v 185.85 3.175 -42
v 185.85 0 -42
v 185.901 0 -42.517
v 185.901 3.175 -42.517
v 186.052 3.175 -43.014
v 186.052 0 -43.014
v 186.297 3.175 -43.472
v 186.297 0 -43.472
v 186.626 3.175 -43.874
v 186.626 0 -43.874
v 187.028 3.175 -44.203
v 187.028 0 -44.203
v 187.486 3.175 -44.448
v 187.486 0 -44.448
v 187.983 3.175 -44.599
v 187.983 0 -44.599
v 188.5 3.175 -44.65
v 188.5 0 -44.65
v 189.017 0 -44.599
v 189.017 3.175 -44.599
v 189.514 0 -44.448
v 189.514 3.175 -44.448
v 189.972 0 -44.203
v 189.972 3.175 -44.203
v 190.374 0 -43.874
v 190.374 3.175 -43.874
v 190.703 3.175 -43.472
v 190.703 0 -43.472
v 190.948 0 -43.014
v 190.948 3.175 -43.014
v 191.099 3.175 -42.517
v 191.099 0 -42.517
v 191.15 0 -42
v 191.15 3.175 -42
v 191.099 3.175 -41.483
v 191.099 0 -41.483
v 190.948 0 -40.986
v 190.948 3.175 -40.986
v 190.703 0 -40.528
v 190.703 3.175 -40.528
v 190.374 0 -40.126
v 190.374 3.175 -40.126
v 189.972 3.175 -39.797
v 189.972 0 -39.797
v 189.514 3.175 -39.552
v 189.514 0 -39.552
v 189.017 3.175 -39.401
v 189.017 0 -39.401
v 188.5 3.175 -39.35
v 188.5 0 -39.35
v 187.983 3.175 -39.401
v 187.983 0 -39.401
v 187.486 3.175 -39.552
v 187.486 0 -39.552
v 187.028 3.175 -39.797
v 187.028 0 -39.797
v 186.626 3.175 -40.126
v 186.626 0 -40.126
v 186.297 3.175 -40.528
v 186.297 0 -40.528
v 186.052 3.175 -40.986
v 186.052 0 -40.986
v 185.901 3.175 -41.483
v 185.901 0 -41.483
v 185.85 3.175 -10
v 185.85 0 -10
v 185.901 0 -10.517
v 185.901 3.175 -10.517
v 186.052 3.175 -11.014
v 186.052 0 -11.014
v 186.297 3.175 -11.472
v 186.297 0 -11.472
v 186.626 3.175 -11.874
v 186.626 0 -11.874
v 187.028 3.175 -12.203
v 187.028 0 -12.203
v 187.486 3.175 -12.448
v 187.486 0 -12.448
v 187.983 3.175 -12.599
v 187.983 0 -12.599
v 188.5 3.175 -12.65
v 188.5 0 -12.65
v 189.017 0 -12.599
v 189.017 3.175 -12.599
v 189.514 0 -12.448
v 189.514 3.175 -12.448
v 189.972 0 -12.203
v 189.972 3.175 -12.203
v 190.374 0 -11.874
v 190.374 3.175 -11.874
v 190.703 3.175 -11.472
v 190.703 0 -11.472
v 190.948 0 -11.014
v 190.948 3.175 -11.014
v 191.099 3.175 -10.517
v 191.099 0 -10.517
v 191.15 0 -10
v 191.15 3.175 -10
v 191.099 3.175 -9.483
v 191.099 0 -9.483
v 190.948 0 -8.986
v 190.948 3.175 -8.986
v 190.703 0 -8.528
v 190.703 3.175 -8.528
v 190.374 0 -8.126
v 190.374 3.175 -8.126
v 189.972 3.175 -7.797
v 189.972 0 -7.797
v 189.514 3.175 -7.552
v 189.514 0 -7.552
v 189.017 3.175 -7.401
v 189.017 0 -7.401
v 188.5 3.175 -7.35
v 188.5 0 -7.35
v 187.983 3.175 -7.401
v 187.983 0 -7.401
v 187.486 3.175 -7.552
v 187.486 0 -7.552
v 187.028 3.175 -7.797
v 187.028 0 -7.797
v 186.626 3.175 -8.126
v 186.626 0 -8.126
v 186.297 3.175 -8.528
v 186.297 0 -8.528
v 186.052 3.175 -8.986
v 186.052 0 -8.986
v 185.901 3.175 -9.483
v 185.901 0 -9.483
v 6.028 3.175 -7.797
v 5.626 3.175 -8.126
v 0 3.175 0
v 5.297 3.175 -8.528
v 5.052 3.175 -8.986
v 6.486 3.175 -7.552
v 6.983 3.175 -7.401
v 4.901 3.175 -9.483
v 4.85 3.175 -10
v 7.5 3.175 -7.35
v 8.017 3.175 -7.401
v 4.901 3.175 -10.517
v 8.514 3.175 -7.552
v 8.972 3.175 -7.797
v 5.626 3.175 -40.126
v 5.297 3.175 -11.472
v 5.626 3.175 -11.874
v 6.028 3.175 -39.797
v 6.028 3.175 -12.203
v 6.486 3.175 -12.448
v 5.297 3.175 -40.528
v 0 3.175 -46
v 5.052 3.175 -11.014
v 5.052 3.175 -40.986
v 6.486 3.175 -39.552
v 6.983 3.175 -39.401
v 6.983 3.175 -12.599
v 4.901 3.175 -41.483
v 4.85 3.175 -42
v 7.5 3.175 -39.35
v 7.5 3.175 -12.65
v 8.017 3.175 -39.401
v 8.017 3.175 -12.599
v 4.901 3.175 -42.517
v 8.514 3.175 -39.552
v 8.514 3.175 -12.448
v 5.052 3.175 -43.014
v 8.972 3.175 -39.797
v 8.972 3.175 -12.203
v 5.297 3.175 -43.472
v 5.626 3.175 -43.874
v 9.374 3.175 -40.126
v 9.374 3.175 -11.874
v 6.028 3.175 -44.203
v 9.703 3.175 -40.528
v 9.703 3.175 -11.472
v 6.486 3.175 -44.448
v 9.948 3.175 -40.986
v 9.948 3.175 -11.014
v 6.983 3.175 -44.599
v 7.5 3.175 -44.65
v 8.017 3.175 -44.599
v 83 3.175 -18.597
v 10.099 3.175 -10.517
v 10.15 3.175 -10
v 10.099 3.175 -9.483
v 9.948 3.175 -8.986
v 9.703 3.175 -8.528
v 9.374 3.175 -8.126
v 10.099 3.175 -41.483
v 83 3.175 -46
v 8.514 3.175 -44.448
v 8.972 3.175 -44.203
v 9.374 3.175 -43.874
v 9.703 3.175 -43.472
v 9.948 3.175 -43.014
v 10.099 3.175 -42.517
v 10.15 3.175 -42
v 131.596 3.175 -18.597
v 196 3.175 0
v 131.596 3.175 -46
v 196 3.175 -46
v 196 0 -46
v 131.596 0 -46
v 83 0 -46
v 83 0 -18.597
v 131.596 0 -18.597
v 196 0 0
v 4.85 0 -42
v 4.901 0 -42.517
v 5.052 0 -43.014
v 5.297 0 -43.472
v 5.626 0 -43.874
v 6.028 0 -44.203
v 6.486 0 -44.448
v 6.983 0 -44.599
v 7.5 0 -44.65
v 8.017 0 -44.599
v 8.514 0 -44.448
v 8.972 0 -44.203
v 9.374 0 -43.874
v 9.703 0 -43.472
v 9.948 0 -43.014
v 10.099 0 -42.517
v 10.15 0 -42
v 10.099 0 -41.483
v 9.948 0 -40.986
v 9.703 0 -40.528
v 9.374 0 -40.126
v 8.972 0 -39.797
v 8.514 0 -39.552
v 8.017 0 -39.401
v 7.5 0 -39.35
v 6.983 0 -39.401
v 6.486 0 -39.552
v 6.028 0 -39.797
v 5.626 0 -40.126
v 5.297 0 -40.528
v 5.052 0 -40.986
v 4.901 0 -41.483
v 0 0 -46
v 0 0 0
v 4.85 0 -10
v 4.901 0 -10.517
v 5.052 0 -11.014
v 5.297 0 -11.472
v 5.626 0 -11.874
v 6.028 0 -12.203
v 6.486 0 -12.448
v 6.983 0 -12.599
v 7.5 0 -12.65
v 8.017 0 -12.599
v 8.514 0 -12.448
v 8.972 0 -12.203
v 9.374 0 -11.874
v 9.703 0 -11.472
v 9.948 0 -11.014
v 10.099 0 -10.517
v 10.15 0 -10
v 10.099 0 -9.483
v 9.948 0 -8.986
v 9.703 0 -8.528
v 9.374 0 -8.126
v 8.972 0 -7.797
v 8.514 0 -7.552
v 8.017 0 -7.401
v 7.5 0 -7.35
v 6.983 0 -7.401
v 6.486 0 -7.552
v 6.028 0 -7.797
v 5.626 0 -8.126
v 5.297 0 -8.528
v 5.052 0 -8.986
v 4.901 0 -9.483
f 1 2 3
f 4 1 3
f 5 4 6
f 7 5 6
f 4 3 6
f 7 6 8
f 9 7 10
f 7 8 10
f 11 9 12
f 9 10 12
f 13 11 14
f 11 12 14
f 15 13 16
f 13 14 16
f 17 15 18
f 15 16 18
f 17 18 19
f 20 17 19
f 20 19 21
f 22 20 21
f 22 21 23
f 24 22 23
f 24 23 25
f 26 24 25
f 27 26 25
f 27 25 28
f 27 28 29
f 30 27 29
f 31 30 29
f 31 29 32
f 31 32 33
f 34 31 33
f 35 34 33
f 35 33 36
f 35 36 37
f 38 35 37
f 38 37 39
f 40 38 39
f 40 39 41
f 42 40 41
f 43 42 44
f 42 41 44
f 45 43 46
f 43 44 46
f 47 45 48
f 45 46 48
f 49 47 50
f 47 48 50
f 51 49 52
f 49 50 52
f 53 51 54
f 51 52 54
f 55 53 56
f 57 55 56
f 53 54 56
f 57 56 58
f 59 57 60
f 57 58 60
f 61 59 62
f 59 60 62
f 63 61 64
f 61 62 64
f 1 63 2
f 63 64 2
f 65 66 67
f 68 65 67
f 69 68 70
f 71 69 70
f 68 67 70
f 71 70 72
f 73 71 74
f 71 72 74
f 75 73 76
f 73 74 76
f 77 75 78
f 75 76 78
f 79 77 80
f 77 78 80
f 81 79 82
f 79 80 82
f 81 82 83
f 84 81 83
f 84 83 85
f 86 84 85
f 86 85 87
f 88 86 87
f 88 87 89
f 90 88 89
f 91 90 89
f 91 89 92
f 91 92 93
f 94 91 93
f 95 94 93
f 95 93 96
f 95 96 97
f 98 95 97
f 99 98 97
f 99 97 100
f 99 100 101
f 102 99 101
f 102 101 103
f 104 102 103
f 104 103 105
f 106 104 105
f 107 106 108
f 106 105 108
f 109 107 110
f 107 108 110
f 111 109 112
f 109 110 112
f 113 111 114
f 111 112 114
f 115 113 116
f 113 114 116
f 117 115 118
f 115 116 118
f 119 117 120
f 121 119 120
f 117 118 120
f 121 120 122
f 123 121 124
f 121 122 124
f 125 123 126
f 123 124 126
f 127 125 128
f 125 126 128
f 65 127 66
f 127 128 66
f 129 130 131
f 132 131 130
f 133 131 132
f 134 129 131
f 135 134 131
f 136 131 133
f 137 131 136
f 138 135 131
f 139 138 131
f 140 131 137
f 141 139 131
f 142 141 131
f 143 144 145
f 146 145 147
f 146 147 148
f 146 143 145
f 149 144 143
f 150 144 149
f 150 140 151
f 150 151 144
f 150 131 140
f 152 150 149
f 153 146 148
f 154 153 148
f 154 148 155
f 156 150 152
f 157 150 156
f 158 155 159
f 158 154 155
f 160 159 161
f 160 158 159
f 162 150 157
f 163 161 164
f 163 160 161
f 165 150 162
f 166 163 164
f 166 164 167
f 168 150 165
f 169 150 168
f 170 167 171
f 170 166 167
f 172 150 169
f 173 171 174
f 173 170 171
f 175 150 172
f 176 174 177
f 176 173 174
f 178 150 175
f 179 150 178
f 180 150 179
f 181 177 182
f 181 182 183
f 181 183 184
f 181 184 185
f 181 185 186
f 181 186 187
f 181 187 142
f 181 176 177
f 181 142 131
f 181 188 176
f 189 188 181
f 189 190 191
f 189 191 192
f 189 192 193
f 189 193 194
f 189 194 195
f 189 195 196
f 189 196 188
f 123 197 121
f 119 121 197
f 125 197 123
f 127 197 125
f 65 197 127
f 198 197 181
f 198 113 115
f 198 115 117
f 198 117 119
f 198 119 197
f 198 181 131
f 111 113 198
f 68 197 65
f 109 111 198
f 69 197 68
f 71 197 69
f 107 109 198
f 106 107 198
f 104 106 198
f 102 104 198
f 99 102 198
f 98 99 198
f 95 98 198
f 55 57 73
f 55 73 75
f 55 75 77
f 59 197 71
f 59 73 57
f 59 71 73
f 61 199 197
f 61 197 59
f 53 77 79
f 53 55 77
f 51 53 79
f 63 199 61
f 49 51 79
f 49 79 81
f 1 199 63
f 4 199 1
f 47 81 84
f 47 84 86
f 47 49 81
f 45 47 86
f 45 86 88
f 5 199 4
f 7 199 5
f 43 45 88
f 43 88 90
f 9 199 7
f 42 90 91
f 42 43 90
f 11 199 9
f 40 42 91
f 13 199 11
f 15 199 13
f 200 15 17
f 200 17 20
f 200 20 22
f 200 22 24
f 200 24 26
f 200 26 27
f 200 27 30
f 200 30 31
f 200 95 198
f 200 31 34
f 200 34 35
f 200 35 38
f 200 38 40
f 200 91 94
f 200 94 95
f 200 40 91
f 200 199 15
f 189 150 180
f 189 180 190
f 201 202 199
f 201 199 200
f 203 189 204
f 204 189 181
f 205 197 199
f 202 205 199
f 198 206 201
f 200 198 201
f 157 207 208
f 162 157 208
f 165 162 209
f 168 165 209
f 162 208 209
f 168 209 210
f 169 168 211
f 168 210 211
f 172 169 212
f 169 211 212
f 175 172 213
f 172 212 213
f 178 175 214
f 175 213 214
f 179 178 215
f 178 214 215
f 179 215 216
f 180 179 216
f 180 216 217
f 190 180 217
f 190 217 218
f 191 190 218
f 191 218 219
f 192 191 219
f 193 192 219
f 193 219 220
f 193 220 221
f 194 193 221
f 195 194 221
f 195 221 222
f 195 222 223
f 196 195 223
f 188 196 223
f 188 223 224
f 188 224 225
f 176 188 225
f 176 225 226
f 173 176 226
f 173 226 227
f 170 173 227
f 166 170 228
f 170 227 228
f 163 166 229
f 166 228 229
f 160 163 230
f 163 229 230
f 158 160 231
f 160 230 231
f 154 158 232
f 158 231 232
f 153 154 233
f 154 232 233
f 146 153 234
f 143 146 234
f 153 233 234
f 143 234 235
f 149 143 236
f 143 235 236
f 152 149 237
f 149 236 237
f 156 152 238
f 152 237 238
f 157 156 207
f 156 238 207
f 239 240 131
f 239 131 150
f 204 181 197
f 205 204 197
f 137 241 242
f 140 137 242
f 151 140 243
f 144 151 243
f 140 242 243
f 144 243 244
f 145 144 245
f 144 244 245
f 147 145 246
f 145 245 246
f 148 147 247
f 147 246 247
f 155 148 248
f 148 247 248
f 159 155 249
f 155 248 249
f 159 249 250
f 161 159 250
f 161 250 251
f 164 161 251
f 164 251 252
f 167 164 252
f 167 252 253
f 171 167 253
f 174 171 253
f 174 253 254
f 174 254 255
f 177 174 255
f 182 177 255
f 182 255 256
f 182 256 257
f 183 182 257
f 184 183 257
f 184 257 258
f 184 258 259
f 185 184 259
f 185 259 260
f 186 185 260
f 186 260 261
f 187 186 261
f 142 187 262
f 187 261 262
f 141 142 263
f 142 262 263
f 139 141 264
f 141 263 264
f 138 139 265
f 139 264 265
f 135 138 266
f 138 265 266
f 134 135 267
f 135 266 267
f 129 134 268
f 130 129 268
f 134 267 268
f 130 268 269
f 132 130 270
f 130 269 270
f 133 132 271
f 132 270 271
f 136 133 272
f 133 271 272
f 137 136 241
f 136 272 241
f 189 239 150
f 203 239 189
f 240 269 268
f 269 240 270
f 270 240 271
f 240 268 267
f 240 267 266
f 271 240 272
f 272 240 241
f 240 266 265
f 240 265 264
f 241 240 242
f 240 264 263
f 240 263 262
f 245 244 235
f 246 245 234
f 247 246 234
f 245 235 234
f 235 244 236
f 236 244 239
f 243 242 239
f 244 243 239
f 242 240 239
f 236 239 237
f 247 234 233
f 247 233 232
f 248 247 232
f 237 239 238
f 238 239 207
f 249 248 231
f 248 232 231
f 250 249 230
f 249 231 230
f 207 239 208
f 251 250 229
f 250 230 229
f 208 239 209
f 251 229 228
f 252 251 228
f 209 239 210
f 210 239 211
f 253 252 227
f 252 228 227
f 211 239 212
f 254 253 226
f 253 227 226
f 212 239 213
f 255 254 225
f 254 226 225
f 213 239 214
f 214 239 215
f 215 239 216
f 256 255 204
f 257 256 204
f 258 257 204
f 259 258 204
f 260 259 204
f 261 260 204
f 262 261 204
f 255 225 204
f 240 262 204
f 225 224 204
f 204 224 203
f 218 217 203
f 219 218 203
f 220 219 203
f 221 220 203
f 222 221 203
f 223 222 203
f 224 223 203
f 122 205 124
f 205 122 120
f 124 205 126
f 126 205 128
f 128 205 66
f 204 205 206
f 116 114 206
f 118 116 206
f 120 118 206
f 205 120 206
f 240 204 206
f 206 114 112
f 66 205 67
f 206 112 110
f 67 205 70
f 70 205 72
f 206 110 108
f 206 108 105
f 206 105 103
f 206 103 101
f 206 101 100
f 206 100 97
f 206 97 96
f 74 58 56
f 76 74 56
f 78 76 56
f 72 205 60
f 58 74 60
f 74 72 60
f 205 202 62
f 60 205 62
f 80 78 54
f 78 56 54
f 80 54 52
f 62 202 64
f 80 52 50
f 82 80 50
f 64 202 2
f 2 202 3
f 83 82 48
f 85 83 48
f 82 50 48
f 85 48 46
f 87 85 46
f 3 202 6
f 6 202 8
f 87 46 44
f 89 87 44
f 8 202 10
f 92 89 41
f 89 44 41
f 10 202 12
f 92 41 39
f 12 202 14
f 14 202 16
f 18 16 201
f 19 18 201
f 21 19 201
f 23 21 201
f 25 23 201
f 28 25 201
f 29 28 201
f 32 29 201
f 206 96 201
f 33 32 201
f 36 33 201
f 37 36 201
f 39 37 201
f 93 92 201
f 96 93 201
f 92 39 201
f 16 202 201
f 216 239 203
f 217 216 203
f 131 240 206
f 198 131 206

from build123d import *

# Parameters (mm, degrees)
SKETCH1_W            = 196
SKETCH1_H            = 46
BOSS_EXTRUDE1_DEPTH  = 3.175
SKETCH2_W            = 30
SKETCH2_H            = 10.018068389
SKETCH2_W_2          = 48.596040924
SKETCH2_H_2          = 27.403064809
CUT_EXTRUDE1_DEPTH   = 3.175
M5_CLEARANCE_HOLE1_D = 5.3


with BuildPart() as part:
    # Sketch1 → Boss-Extrude1 (new body)
    with BuildSketch(Plane(origin=(0, 0, 0), x_dir=(1, 0, 0), z_dir=(0, 1, 0))):
        with Locations((98, 23)):
            Rectangle(SKETCH1_W, SKETCH1_H)
    extrude(amount=BOSS_EXTRUDE1_DEPTH)

    # Sketch2 → Cut-Extrude1 (cut)
    with BuildSketch(Plane(origin=(0, 3.175, 0), x_dir=(1, 0, 0), z_dir=(0, 1, 0))):
        with Locations((98, 40.990965805)):
            Rectangle(SKETCH2_W, SKETCH2_H)
        with BuildLine():
            ThreePointArc((83, 35.981931611), (98, 20.981931611), (113, 35.981931611))
            Line((113, 35.981931611), (83, 35.981931611))
        make_face()
        with Locations((107.298020462, 32.298467596)):
            Rectangle(SKETCH2_W_2, SKETCH2_H_2)
    extrude(amount=-CUT_EXTRUDE1_DEPTH, mode=Mode.SUBTRACT)

    # M5 Clearance Hole1 (through all)
    with Locations(Plane(origin=(0, 3.175, 0), x_dir=(1, 0, 0), z_dir=(0, 1, 0))):
        with Locations((188.5, 10), (7.5, 10), (188.5, 42), (7.5, 42)):
            Hole(M5_CLEARANCE_HOLE1_D / 2)


solid = part.part
